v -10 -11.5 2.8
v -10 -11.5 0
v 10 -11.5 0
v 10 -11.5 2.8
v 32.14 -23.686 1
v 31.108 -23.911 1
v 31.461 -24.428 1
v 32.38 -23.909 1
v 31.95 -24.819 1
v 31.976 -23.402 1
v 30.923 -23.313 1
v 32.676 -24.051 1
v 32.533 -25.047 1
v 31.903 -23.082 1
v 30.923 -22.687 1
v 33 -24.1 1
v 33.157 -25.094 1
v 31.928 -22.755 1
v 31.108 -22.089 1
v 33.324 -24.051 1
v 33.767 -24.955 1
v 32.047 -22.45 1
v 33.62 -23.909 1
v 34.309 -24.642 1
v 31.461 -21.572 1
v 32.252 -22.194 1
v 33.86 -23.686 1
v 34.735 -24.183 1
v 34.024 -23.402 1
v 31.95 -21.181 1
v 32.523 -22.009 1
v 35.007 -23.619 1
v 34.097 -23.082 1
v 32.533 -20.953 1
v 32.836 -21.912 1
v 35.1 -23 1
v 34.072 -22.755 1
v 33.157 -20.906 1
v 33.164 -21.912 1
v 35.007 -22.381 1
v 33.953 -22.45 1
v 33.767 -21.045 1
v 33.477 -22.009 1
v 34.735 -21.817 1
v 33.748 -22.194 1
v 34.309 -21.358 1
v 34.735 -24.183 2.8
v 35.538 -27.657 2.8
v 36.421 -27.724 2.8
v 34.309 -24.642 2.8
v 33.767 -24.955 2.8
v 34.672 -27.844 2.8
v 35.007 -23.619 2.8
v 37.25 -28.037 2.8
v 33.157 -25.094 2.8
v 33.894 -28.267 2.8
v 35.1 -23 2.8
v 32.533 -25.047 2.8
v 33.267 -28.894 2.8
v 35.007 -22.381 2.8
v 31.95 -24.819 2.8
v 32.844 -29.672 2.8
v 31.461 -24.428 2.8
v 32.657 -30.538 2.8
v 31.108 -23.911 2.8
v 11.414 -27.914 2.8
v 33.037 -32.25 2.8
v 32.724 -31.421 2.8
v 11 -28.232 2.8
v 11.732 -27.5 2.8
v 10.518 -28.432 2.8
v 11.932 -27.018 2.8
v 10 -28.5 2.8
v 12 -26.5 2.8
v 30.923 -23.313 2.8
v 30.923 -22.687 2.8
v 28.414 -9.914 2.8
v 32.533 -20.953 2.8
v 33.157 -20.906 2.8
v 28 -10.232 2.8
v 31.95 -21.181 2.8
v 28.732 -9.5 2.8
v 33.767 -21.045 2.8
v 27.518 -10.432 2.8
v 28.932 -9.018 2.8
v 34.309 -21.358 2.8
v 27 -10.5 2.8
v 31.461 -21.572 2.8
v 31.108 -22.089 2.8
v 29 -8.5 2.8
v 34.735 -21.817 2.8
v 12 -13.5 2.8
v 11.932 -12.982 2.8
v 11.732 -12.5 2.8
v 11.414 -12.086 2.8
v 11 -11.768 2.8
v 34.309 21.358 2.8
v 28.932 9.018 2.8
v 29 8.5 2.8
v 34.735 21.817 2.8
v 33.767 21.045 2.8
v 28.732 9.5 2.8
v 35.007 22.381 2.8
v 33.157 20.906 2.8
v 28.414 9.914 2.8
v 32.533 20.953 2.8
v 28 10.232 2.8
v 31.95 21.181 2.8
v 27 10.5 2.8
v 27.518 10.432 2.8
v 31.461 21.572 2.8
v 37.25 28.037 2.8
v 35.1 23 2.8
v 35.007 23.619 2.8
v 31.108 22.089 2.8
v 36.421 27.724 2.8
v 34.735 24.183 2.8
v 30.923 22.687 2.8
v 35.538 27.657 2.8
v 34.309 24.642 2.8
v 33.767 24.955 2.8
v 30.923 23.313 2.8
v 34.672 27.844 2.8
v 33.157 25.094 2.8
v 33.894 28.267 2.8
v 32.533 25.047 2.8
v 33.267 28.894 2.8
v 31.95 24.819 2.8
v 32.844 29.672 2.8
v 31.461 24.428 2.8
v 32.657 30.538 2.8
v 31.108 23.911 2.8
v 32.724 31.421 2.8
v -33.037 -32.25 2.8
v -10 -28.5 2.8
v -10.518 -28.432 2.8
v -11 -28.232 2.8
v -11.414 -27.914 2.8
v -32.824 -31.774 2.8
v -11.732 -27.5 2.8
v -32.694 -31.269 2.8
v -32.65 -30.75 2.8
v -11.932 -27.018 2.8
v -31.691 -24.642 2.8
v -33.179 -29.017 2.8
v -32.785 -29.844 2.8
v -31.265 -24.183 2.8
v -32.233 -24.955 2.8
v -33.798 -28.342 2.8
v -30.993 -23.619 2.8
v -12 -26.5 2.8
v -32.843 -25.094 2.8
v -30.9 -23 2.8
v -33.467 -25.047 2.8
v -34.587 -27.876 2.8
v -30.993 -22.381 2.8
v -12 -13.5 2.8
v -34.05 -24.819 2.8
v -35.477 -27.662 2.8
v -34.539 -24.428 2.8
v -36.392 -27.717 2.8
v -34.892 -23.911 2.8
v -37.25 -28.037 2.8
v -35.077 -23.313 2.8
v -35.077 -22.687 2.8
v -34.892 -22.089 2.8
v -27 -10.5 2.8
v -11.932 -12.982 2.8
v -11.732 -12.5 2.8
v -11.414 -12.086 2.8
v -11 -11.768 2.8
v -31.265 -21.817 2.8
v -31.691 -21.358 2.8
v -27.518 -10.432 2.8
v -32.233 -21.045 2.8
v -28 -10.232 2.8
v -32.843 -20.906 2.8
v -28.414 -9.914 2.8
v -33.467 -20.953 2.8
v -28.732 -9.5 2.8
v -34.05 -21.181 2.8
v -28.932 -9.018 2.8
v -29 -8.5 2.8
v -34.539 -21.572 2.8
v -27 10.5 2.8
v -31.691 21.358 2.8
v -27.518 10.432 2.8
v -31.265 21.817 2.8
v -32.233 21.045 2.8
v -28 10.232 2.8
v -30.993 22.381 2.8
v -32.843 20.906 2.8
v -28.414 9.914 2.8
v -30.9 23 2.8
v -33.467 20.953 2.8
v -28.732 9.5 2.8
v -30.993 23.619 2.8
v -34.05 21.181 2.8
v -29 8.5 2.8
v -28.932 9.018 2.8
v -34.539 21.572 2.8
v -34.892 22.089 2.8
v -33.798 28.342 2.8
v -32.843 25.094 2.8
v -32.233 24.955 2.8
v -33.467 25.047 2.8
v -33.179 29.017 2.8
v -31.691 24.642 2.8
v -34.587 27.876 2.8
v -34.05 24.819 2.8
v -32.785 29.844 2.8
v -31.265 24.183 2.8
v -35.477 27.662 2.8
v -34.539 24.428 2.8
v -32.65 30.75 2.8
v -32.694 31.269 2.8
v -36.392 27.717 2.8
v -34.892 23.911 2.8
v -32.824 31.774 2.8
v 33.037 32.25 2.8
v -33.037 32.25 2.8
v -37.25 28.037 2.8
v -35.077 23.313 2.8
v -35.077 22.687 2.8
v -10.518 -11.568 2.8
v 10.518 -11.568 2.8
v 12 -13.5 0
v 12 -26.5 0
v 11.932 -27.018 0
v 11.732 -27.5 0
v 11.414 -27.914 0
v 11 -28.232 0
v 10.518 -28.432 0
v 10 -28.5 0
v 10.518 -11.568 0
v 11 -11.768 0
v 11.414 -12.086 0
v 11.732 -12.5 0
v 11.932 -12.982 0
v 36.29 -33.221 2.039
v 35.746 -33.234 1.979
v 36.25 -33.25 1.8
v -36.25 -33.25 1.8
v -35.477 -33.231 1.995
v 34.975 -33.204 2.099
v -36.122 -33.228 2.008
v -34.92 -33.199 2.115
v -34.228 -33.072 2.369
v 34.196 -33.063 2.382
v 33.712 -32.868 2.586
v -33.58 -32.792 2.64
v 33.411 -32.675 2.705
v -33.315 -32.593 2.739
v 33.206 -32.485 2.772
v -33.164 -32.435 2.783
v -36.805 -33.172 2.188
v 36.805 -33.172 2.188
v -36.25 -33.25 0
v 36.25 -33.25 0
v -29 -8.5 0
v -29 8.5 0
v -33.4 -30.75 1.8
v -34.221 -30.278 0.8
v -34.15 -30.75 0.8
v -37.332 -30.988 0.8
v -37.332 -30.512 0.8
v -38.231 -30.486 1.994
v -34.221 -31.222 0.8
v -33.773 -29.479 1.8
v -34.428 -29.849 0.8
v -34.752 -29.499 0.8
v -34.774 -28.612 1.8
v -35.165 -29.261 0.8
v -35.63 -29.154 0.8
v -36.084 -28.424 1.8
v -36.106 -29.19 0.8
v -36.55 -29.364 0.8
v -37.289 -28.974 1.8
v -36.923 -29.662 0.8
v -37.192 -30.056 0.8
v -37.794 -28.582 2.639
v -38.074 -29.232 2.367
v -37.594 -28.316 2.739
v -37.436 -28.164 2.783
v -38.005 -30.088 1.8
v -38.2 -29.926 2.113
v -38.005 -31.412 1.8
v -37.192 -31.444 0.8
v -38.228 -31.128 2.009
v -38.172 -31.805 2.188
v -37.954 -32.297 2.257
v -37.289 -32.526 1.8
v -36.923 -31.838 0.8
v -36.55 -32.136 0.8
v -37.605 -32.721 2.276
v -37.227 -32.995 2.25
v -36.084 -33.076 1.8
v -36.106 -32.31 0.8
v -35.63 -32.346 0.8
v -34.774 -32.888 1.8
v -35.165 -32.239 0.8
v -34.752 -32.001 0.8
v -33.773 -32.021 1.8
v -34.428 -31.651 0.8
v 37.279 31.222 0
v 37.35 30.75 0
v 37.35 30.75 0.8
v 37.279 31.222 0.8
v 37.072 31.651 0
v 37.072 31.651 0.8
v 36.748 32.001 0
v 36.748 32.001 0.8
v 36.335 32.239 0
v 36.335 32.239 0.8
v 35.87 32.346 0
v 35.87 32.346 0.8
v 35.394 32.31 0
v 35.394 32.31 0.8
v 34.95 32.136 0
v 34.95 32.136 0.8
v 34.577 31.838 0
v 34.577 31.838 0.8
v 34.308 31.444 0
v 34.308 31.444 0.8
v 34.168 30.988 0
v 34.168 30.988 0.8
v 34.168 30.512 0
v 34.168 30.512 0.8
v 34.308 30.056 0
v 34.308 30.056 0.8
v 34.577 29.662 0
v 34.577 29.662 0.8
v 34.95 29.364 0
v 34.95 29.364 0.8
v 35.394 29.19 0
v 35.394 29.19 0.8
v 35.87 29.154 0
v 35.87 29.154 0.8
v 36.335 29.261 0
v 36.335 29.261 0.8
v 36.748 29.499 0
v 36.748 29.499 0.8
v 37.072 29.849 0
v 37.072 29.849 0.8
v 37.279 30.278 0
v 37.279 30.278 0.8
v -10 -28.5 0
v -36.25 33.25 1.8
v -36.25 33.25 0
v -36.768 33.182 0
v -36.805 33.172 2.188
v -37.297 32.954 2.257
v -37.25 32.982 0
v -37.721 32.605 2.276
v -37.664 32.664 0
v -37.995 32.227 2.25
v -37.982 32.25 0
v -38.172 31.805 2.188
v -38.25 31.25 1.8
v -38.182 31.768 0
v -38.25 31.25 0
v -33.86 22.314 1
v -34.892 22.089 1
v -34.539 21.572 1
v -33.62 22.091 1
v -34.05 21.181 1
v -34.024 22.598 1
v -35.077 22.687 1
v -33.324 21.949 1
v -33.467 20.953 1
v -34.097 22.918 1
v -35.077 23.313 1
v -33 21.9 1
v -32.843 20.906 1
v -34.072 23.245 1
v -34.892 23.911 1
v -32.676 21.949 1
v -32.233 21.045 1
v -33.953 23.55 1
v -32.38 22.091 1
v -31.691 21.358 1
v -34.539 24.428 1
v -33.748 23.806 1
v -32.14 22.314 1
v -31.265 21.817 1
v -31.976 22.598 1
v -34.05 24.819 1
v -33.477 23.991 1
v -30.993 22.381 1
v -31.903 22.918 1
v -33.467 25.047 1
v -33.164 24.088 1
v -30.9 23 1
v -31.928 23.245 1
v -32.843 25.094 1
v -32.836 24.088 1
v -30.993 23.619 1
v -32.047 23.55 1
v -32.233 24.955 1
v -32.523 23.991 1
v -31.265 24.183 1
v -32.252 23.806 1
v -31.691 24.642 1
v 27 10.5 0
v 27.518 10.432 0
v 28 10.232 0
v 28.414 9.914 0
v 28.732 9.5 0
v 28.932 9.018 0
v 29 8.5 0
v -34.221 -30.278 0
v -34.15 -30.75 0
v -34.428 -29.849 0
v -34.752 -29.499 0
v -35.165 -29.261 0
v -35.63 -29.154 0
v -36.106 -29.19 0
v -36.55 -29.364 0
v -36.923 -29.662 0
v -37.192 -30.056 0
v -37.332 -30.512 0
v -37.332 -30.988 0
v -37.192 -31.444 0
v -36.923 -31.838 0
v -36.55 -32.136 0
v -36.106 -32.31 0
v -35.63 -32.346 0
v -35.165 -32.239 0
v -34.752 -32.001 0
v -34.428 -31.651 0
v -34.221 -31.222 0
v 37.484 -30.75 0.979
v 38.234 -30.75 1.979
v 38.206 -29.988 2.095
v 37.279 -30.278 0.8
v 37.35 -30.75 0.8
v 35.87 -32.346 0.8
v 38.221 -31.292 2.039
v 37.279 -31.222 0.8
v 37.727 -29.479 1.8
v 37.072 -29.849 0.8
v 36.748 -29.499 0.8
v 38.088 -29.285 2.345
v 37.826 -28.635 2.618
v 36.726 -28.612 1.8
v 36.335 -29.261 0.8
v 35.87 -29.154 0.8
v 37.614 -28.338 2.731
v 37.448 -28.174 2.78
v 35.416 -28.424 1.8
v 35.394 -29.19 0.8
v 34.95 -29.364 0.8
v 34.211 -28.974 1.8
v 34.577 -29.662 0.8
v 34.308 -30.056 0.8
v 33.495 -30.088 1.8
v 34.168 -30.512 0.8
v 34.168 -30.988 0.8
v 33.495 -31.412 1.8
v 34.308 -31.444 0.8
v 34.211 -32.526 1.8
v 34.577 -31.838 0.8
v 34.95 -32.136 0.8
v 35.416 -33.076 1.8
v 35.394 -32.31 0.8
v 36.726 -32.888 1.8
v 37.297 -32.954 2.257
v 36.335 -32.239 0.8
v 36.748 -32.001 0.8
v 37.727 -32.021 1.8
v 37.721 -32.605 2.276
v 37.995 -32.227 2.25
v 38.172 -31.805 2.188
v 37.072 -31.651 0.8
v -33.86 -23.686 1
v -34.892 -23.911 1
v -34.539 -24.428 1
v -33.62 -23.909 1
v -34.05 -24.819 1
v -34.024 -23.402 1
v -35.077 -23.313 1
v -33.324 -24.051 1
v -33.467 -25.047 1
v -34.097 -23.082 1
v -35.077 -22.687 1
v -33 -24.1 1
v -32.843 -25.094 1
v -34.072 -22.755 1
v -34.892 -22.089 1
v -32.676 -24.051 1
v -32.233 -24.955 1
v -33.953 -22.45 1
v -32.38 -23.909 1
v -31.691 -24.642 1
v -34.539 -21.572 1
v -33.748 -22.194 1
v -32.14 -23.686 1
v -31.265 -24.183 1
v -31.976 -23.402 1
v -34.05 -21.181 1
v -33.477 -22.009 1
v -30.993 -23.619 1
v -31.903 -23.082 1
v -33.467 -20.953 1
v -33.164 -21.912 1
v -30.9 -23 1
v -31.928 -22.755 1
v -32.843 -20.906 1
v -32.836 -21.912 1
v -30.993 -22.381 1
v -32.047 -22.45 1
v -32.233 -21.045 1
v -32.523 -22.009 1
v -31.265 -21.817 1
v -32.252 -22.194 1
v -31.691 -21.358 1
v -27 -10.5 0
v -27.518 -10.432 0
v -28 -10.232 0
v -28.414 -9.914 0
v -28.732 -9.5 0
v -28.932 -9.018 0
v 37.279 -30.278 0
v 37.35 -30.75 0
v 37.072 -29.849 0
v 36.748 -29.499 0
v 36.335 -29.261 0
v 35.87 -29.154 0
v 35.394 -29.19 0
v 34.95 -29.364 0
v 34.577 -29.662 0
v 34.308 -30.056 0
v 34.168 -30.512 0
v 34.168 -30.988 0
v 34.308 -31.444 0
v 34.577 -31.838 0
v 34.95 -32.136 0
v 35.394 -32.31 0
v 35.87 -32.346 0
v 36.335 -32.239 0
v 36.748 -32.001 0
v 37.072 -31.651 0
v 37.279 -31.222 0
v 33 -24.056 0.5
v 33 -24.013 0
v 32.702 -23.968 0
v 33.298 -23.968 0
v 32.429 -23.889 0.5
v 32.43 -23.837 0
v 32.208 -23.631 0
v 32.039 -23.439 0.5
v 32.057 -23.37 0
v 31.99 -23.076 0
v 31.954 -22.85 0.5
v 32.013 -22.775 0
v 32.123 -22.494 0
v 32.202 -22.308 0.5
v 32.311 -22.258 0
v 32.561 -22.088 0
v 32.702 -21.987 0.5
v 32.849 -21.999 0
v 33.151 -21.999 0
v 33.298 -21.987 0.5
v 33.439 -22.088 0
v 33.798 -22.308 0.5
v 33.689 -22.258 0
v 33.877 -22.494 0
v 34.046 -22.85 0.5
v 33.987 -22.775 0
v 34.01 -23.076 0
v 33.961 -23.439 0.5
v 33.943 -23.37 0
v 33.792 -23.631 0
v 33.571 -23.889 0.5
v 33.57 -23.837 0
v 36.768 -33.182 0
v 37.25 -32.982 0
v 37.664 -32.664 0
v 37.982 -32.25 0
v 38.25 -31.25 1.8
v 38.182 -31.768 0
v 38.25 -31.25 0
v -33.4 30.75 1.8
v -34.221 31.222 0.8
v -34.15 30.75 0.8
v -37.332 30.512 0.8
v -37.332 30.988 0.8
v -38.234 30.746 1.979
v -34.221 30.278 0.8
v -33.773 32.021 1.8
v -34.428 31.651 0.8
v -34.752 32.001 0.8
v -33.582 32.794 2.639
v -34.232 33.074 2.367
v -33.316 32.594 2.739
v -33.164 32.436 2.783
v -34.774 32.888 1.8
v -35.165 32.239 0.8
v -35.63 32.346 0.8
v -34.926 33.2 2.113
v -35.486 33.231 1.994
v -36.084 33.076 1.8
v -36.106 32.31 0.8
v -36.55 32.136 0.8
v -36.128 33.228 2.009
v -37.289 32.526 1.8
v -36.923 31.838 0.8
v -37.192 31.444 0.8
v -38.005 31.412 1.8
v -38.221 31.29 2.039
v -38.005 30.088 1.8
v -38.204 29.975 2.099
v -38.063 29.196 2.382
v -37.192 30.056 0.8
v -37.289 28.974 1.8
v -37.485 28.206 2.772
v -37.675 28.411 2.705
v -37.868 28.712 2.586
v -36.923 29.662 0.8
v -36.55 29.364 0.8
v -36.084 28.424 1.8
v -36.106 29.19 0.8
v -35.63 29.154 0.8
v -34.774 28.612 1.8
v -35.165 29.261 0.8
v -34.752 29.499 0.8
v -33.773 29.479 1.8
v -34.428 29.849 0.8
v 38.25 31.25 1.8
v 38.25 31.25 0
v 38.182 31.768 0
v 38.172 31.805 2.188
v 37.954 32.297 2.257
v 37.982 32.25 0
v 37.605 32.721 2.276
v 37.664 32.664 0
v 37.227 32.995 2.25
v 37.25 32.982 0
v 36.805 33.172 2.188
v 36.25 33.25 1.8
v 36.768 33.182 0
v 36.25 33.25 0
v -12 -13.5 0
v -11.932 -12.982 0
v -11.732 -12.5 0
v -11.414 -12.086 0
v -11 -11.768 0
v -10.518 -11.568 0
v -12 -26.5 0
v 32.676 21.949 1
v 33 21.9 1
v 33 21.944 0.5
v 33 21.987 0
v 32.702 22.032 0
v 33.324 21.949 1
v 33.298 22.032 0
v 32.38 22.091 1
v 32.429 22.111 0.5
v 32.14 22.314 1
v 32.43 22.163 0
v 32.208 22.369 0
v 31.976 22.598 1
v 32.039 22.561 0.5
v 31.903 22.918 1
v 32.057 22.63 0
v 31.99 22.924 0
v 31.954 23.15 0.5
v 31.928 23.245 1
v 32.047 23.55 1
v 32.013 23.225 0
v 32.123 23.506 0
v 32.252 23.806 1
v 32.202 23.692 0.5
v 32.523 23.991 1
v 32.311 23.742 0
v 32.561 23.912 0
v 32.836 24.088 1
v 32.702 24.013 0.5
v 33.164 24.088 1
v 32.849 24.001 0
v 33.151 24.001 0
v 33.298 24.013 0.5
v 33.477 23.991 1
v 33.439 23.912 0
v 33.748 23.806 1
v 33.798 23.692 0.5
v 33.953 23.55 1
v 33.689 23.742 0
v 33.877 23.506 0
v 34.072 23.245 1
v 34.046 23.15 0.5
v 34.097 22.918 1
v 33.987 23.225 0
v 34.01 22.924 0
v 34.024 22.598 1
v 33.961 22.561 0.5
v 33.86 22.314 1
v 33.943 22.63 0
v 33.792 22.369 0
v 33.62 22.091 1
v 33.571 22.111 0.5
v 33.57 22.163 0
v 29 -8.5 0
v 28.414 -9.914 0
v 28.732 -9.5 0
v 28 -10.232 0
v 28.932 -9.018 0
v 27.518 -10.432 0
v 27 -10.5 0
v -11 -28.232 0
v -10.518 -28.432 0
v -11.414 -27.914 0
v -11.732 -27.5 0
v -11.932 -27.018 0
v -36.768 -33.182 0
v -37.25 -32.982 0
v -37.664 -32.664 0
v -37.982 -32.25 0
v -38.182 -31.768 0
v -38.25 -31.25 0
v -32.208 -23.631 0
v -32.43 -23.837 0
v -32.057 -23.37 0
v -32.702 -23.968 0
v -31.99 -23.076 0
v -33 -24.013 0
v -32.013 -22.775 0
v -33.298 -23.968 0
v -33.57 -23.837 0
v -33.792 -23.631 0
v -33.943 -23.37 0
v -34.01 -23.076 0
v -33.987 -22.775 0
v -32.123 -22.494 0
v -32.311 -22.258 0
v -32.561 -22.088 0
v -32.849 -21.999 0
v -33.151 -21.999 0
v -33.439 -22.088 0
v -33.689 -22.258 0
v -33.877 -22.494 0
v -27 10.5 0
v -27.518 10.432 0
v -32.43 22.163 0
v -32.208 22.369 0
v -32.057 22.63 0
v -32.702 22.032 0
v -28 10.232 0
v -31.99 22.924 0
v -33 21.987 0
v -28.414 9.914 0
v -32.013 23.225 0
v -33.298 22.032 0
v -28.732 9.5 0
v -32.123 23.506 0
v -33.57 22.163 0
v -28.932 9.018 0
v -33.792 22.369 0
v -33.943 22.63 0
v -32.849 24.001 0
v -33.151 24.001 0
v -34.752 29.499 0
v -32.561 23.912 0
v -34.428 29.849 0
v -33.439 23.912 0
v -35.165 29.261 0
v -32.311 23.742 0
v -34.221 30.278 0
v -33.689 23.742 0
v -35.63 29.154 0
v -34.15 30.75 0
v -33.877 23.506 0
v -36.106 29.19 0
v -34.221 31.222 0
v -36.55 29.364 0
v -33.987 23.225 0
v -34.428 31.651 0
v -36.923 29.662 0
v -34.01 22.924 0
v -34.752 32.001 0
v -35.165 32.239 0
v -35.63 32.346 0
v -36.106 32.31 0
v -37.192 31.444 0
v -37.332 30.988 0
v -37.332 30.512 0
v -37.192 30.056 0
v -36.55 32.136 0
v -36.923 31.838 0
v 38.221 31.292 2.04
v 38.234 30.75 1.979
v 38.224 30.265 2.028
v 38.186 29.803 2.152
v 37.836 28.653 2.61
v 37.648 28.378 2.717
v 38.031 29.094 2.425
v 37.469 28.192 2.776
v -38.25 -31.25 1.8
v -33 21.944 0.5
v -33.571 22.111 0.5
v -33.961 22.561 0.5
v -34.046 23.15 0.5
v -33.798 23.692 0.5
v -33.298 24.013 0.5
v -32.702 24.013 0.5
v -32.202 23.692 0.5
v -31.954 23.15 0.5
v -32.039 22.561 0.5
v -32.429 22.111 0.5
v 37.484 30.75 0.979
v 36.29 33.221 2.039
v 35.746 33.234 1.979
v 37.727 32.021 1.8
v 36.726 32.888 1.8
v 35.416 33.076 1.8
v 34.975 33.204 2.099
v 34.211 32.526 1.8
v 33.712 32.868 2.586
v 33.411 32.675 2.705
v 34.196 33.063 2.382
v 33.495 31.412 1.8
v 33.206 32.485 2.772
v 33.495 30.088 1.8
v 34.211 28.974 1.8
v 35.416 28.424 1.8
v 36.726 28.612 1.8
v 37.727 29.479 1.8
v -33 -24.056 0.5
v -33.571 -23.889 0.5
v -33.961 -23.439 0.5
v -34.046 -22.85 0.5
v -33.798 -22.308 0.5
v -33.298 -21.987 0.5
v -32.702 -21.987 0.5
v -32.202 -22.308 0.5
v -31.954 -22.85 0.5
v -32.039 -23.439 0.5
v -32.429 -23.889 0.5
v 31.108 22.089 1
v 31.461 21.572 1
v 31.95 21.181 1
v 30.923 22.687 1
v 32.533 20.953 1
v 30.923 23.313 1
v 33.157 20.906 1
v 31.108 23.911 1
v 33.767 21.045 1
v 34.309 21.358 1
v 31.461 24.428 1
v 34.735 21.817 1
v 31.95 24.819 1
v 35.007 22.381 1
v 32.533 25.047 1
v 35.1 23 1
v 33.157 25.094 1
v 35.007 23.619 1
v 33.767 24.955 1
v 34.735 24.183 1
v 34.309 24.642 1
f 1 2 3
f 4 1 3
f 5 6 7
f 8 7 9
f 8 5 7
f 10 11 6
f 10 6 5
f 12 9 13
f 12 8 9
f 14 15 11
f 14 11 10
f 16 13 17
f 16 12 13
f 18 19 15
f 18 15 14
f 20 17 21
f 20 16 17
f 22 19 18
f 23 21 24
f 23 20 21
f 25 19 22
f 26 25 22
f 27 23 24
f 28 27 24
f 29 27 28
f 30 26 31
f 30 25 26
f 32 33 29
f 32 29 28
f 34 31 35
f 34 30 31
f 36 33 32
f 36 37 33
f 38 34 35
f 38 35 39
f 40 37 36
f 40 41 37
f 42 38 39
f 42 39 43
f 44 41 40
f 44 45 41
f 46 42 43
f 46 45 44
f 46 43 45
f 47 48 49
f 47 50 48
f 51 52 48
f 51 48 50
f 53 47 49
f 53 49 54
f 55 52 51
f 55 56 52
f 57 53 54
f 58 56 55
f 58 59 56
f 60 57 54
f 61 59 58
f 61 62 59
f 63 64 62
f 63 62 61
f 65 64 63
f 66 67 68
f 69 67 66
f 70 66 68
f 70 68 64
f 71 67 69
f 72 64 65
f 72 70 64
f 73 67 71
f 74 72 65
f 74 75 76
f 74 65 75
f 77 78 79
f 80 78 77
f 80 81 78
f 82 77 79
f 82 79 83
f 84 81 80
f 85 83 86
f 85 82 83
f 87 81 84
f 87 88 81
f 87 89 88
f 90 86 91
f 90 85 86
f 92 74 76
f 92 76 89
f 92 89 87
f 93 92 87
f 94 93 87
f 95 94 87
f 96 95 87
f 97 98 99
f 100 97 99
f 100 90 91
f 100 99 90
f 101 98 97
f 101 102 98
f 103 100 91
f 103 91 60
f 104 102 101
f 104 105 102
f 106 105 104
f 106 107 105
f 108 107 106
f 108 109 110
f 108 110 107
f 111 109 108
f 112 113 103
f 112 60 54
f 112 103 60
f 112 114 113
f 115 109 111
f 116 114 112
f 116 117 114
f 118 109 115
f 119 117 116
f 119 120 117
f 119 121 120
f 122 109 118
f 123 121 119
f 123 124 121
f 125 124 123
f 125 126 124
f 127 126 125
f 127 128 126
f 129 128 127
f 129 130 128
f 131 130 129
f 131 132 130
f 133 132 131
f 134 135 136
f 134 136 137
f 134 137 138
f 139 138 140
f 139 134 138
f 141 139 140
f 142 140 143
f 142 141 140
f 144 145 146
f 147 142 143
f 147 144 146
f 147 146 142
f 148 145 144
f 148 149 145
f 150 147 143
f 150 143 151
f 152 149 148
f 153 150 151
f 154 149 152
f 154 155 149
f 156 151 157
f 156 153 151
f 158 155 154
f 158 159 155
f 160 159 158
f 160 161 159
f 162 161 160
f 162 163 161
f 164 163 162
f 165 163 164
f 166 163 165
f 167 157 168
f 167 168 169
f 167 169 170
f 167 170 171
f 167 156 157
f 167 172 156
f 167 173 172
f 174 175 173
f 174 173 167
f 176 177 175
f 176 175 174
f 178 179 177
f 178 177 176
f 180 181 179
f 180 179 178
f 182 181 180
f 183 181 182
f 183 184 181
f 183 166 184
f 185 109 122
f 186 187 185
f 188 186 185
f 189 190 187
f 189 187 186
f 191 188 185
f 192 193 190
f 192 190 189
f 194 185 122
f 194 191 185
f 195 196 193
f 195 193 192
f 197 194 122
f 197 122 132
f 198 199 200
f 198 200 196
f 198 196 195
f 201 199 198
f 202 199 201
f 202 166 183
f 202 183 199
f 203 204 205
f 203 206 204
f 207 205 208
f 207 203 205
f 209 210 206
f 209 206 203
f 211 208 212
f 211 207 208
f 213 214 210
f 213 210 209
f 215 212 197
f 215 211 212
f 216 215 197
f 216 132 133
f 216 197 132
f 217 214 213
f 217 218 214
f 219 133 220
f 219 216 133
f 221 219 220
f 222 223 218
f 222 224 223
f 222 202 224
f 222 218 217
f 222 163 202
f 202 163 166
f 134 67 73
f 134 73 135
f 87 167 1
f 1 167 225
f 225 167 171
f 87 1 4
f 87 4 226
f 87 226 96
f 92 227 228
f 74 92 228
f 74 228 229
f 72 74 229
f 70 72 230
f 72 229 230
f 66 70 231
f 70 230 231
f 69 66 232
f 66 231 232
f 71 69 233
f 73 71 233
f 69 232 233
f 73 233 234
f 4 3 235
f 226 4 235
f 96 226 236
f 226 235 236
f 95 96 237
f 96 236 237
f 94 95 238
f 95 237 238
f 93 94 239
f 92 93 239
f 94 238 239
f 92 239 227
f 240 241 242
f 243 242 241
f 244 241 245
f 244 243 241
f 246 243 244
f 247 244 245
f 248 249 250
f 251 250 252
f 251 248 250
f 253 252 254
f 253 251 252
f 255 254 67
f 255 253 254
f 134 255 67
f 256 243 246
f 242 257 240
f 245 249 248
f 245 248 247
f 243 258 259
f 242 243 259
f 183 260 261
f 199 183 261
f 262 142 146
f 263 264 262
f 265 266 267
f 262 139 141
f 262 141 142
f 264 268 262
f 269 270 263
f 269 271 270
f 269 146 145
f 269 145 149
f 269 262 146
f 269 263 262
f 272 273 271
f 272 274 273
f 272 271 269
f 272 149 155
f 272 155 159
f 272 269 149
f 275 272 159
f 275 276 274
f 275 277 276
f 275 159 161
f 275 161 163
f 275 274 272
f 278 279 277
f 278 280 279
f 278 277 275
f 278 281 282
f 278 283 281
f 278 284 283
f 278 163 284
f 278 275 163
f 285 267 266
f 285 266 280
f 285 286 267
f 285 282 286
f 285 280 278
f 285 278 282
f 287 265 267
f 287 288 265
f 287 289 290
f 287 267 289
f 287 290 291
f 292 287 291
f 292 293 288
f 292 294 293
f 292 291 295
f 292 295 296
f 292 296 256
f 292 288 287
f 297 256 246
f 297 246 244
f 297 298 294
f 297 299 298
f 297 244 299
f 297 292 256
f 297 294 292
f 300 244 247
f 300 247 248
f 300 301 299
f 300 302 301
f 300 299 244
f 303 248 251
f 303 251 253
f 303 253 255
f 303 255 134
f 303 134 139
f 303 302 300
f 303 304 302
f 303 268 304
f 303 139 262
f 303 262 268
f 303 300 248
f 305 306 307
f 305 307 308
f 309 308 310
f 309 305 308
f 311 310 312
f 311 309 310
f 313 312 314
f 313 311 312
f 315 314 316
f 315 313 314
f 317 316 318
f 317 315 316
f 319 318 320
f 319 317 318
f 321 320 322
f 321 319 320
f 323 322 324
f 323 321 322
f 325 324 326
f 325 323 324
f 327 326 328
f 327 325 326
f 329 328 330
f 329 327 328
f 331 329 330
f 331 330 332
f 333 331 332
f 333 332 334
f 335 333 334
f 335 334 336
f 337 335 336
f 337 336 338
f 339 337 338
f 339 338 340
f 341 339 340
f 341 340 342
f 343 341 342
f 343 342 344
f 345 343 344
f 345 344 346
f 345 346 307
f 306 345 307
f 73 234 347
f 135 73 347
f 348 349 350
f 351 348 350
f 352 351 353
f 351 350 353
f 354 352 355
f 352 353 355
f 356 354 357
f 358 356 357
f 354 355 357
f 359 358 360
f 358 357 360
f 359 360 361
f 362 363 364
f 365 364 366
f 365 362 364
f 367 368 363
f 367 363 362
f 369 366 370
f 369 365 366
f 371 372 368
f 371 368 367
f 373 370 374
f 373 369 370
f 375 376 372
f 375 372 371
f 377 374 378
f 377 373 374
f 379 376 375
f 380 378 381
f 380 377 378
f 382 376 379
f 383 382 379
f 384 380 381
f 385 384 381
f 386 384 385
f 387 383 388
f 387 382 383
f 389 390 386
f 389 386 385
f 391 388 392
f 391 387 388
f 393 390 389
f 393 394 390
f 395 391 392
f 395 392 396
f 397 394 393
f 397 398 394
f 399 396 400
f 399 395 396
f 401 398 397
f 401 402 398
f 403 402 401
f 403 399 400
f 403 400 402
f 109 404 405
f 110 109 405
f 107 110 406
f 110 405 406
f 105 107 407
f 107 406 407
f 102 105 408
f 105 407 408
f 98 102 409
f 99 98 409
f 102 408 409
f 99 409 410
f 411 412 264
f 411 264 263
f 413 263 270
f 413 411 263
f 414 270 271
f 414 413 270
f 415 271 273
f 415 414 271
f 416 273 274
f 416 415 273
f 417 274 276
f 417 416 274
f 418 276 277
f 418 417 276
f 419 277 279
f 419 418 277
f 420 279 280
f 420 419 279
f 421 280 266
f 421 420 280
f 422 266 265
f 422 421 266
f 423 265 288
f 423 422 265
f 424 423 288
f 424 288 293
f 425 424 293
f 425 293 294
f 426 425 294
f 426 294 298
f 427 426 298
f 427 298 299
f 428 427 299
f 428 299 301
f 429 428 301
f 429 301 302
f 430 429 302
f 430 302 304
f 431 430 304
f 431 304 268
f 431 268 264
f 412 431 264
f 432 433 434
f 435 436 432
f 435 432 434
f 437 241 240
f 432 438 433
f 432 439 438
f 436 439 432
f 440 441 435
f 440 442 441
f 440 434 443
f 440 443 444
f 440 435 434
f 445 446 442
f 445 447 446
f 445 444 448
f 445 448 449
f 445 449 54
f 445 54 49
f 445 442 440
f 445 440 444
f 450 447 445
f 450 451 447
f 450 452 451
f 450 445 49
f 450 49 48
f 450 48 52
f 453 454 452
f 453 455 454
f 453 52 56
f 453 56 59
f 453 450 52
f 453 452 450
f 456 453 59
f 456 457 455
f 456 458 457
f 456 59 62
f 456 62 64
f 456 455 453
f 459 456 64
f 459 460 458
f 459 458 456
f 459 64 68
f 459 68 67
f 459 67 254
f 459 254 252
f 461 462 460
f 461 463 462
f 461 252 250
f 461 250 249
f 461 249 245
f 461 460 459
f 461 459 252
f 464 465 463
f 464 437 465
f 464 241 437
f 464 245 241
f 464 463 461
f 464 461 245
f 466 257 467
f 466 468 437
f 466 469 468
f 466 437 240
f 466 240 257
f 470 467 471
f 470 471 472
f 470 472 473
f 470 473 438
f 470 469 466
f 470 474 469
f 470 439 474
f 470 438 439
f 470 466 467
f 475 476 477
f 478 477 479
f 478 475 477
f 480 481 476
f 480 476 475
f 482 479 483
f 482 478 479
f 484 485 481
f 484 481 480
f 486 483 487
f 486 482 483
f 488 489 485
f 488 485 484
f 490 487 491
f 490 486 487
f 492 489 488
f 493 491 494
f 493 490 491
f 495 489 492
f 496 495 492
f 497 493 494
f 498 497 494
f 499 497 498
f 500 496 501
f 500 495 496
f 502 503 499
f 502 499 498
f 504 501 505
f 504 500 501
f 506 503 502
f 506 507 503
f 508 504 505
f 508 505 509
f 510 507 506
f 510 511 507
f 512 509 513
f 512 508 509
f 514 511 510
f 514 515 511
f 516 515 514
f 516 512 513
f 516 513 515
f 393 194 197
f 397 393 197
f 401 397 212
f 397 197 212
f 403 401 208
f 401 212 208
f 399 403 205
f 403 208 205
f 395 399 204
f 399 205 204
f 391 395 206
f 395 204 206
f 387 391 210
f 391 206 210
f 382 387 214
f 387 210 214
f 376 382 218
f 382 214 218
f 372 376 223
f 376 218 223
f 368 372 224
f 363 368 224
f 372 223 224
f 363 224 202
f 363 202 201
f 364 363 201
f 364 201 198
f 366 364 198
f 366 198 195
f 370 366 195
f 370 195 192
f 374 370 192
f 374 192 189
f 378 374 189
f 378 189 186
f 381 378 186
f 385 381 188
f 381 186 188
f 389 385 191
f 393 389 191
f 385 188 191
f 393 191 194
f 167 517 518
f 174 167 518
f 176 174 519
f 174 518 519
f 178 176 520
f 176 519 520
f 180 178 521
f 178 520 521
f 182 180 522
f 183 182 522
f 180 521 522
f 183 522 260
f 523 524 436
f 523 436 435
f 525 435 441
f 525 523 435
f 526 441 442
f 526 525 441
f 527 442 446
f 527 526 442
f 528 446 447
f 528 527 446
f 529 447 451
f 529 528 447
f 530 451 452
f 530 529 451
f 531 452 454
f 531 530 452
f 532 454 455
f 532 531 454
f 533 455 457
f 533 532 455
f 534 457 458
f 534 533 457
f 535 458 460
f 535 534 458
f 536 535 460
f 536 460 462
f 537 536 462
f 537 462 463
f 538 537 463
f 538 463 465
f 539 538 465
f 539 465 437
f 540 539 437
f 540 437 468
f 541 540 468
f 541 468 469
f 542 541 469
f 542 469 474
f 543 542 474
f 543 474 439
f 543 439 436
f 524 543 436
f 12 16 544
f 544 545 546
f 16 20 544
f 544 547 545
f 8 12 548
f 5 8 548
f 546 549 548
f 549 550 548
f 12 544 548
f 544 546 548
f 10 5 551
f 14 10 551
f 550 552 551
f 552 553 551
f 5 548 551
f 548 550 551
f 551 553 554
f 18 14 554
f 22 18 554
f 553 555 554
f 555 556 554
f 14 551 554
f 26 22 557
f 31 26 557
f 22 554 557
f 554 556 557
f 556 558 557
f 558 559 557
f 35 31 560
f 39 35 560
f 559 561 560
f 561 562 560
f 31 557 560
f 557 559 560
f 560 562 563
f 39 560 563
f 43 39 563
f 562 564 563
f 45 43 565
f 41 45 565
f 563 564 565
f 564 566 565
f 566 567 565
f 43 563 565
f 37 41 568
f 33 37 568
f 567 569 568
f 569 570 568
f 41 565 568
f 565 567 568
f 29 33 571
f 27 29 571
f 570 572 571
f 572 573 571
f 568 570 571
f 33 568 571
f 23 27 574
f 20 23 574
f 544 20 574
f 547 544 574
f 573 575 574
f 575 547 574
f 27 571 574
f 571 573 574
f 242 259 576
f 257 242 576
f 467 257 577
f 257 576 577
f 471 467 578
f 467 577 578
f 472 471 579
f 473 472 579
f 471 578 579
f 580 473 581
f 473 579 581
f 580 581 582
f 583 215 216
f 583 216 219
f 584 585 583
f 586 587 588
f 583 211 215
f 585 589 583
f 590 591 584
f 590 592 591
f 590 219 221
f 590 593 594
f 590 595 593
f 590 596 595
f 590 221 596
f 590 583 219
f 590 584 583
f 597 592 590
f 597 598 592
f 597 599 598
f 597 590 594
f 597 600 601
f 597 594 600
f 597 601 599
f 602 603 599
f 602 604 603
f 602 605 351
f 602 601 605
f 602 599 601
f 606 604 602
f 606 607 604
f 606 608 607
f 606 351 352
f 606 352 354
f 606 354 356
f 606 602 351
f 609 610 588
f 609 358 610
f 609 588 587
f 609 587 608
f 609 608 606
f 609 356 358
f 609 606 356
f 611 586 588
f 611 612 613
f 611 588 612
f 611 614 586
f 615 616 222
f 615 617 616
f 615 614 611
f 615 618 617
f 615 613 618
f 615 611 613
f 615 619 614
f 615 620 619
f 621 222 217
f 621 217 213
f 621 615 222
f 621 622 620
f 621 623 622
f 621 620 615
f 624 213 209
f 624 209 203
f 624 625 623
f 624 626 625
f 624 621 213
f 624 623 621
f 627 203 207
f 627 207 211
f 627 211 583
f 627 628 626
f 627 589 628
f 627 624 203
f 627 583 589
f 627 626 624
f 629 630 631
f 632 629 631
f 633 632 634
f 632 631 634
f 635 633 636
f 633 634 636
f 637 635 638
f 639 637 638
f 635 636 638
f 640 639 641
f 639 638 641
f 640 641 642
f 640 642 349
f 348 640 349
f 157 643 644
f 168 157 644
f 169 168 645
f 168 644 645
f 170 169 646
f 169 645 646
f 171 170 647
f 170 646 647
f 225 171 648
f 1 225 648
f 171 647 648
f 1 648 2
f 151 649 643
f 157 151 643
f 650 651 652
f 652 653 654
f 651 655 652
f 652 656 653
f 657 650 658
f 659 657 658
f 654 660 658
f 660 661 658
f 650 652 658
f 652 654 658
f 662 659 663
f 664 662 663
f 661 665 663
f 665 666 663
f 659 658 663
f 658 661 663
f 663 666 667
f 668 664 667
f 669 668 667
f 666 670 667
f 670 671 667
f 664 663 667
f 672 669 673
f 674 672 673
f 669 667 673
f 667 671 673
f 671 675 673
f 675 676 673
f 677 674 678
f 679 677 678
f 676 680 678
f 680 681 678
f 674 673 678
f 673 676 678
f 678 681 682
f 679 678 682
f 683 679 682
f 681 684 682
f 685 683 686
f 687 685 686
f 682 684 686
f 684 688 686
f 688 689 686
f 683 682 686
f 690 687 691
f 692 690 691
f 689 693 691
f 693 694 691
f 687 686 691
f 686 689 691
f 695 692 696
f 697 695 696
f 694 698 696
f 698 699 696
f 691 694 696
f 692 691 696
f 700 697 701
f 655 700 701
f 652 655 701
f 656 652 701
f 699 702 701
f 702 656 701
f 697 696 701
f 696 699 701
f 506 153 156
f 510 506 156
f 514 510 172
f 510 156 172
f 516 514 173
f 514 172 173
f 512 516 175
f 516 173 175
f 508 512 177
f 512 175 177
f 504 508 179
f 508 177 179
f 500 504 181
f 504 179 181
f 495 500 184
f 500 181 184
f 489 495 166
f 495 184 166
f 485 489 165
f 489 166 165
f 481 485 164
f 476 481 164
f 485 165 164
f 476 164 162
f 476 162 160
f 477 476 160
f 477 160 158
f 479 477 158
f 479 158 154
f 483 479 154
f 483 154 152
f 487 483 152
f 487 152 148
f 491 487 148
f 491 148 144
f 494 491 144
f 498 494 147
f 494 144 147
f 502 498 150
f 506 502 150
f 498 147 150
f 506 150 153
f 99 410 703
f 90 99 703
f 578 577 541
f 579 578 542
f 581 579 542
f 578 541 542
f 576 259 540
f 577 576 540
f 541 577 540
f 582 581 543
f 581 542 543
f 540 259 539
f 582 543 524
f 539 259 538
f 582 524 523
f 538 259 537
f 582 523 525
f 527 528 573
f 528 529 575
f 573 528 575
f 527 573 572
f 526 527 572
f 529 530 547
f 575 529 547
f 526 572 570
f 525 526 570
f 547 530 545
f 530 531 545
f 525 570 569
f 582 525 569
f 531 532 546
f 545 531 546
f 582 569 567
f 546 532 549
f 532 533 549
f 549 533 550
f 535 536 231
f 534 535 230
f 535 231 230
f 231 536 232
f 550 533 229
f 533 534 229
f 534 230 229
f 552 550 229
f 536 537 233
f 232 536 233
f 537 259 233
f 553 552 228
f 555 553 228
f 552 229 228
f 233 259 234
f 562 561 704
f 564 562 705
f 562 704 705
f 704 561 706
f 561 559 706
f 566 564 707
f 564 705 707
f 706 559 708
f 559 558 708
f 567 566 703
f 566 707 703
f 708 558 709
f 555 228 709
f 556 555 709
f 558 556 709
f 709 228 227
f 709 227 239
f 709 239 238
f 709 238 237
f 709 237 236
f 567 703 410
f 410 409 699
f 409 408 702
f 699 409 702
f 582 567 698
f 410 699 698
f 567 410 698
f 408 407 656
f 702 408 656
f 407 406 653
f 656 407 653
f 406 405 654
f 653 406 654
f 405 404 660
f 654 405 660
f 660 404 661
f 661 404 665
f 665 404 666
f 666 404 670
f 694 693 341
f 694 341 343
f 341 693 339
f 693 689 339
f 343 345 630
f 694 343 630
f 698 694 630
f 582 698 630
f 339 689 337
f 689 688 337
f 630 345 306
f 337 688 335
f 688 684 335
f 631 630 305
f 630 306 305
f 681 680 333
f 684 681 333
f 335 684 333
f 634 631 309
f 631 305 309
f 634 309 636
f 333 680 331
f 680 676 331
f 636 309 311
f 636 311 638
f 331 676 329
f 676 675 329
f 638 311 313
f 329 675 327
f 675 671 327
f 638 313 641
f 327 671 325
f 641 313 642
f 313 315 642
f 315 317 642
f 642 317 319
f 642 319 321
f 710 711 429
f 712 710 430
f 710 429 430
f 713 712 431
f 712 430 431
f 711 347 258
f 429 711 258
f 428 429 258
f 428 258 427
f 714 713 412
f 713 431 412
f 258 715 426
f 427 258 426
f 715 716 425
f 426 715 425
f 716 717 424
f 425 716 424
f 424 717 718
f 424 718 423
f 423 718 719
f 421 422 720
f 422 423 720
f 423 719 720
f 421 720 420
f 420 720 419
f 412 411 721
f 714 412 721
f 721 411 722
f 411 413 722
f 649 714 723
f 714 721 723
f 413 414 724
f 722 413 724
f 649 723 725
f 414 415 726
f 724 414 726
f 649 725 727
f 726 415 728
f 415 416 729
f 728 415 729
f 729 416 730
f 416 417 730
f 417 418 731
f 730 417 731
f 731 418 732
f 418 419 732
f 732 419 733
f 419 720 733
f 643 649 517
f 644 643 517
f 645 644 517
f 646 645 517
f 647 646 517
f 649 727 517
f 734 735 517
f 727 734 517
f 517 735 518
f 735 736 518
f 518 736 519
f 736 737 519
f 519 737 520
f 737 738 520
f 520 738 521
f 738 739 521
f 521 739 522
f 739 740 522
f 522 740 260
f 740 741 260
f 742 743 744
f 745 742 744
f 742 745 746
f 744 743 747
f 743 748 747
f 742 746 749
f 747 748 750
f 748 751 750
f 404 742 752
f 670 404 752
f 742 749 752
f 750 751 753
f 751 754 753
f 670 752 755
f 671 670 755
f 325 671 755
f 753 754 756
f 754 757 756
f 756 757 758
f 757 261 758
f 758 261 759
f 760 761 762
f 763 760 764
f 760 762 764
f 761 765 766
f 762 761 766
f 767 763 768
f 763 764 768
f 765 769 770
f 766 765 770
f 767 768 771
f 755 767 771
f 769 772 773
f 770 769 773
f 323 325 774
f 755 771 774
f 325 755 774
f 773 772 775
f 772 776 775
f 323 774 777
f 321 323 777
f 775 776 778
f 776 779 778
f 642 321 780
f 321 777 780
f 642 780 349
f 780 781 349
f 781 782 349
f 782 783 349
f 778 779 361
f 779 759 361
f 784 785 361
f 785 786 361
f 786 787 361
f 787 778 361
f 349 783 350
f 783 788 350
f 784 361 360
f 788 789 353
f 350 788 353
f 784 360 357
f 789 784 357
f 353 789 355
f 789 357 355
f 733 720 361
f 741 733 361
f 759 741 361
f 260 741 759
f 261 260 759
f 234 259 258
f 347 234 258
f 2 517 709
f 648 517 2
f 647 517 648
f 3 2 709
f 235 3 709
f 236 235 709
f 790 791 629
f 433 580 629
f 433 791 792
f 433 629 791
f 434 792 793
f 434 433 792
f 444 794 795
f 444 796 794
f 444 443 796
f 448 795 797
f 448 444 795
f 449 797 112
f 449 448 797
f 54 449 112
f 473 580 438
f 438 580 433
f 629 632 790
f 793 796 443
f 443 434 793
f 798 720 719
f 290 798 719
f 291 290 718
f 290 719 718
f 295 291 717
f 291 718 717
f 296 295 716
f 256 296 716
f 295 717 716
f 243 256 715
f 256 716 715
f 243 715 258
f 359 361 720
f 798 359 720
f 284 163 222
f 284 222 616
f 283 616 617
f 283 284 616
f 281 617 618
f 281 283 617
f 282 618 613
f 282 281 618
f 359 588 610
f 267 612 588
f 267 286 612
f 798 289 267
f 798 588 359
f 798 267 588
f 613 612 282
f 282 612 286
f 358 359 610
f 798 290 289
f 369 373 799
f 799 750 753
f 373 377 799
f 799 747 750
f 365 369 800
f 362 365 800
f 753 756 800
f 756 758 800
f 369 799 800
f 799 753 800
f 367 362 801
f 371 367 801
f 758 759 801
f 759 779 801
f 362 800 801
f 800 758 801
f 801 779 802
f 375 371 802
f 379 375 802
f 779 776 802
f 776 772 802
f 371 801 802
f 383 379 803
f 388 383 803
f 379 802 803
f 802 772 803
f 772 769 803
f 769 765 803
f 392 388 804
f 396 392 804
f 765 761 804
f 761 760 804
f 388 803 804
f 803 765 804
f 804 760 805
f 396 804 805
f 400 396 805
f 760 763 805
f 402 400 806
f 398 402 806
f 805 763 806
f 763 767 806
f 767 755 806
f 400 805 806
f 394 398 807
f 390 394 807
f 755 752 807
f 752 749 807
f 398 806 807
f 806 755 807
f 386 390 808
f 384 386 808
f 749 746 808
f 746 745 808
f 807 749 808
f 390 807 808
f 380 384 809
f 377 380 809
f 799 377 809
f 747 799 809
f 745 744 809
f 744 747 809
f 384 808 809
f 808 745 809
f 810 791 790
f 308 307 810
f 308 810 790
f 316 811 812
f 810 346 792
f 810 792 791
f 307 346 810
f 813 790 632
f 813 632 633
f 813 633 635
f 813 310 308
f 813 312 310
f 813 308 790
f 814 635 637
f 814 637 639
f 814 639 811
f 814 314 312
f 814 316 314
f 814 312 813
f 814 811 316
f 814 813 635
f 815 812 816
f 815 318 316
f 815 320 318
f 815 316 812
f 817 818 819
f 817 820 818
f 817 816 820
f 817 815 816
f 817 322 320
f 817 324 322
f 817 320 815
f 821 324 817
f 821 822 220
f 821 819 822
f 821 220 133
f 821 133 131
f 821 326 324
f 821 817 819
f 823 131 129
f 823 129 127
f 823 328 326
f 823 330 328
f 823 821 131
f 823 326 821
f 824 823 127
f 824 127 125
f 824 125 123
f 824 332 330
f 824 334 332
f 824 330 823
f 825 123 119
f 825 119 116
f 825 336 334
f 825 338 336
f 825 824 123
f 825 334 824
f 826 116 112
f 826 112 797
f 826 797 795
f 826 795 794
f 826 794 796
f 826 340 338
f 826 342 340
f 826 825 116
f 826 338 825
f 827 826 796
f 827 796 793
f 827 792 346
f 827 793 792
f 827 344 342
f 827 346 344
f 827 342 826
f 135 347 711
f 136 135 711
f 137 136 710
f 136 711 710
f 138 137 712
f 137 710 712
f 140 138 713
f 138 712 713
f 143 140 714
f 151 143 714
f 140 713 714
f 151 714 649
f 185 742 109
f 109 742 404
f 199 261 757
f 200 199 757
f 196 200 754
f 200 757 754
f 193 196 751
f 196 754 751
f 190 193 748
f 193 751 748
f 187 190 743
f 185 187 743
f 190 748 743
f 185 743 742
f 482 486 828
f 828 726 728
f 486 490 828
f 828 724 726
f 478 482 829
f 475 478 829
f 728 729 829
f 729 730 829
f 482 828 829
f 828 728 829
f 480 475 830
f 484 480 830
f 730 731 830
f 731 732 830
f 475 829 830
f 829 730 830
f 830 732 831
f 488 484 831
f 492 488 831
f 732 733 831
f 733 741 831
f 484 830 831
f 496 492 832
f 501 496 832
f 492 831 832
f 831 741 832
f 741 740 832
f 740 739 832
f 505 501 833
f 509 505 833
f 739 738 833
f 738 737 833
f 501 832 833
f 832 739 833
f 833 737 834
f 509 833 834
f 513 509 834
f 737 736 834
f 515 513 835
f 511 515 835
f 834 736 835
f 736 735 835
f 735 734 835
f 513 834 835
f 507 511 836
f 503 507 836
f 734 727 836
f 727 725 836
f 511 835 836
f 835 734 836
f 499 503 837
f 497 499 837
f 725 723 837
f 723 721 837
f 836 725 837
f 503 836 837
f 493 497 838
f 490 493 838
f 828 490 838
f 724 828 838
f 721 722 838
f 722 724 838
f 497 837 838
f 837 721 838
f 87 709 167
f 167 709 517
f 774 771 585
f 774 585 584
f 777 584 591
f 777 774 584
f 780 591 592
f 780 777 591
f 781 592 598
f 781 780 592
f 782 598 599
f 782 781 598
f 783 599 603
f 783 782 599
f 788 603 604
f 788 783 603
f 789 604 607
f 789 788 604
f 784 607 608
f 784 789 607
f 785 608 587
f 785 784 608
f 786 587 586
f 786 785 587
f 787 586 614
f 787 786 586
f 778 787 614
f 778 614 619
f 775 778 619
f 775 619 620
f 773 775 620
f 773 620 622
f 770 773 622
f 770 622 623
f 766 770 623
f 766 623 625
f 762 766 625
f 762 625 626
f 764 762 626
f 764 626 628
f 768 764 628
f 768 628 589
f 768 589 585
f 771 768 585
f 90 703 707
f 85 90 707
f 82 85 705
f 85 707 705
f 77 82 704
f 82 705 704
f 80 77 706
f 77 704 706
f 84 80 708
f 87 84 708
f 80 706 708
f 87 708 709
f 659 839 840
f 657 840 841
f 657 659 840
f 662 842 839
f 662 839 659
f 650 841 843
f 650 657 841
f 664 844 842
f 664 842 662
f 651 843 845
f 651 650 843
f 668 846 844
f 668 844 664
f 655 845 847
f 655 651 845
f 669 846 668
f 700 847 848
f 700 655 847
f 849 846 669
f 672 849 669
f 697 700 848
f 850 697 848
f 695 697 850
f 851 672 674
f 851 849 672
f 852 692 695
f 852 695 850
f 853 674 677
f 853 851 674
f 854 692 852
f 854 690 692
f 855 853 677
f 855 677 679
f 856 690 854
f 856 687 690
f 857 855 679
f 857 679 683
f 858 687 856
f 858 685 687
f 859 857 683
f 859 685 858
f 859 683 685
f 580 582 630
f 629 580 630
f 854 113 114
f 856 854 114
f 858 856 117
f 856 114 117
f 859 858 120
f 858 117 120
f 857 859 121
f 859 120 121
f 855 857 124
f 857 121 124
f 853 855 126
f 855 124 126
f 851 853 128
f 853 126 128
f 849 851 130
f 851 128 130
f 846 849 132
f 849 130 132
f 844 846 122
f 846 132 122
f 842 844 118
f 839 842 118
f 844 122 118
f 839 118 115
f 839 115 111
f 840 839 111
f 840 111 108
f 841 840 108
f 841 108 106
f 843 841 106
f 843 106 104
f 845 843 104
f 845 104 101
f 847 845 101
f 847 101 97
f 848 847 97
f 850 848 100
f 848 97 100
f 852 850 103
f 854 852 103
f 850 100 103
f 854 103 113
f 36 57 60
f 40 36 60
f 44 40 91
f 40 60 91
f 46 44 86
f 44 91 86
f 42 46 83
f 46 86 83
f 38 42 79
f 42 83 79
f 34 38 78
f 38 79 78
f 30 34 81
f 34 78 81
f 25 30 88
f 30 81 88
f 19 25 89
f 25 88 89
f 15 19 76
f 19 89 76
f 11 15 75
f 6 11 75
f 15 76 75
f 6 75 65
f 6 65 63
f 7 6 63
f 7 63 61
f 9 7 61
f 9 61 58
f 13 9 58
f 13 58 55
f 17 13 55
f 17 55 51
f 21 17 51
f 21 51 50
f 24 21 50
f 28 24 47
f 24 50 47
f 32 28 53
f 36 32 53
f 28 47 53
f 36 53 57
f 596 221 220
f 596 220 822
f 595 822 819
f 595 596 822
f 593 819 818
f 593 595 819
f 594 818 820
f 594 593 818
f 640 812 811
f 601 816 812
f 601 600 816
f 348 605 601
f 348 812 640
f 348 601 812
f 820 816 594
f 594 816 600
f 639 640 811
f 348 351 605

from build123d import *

# Parameters (mm, degrees)
SKETCH1_R           = 1.6
BOSS_EXTRUDE1_DEPTH = 2.8
CUT_EXTRUDE2_START  = 2.8
SKETCH1_6_R         = 2.1
CUT_EXTRUDE2_DEPTH  = 1.8
CHAMFER1_SIZE       = 1.5
CHAMFER1_SIZE_2     = 2
FILLET1_START       = -33.224011807
FILLET1_DEPTH       = 66.448023614
FILLET1_START_2     = -38.224011807
FILLET1_2_DEPTH     = 76.3236742


with BuildPart() as part:
    # Sketch1 → Boss-Extrude1 (new body)
    with BuildSketch(Plane(origin=(0, 0, 0), x_dir=(0, 1, 0), z_dir=(0, 0, 1))):
        with BuildLine():
            Line((31.25, 38.25), (-31.25, 38.25))
            ThreePointArc((-31.25, 38.25), (-32.664213562, 37.664213562), (-33.25, 36.25))
            Line((-33.25, 36.25), (-33.25, -36.25))
            ThreePointArc((-33.25, -36.25), (-32.664213562, -37.664213562), (-31.25, -38.25))
            Line((-31.25, -38.25), (31.25, -38.25))
            ThreePointArc((31.25, -38.25), (32.664213562, -37.664213562), (33.25, -36.25))
            Line((33.25, -36.25), (33.25, 36.25))
            ThreePointArc((33.25, 36.25), (32.664213562, 37.664213562), (31.25, 38.25))
        make_face()
        with Locations(Location((-30.75, -35.75, 0), (0, 0, 270))):
            Circle(SKETCH1_R, mode=Mode.SUBTRACT)
        with Locations(Location((30.75, -35.75, 0), (0, 0, 270))):
            Circle(SKETCH1_R, mode=Mode.SUBTRACT)
        with BuildLine():
            ThreePointArc((-28.5, 10), (-27.914213562, 11.414213562), (-26.5, 12))
            Line((-26.5, 12), (-13.5, 12))
            ThreePointArc((-13.5, 12), (-12.085786438, 11.414213562), (-11.5, 10))
            Line((-11.5, 10), (-11.5, -10))
            ThreePointArc((-11.5, -10), (-12.085786438, -11.414213562), (-13.5, -12))
            Line((-13.5, -12), (-26.5, -12))
            ThreePointArc((-26.5, -12), (-27.914213562, -11.414213562), (-28.5, -10))
            Line((-28.5, -10), (-28.5, 10))
        make_face(mode=Mode.SUBTRACT)
        with Locations(Location((-30.75, 35.75, 0), (0, 0, 270))):
            Circle(SKETCH1_R, mode=Mode.SUBTRACT)
        with BuildLine():
            Line((-10.5, -27), (-10.5, 27))
            ThreePointArc((-10.5, 27), (-9.914213562, 28.414213562), (-8.5, 29))
            Line((-8.5, 29), (8.5, 29))
            ThreePointArc((8.5, 29), (9.914213562, 28.414213562), (10.5, 27))
            Line((10.5, 27), (10.5, -27))
            ThreePointArc((10.5, -27), (9.914213562, -28.414213562), (8.5, -29))
            Line((8.5, -29), (-8.5, -29))
            ThreePointArc((-8.5, -29), (-9.914213562, -28.414213562), (-10.5, -27))
        make_face(mode=Mode.SUBTRACT)
        with Locations(Location((30.75, 35.75, 0), (0, 0, 270))):
            Circle(SKETCH1_R, mode=Mode.SUBTRACT)
    extrude(amount=BOSS_EXTRUDE1_DEPTH)

    # Sketch1<6> → Cut-Extrude2 (cut)
    with BuildSketch(Plane(origin=(0, 0, 0), x_dir=(0, 1, 0), z_dir=(0, 0, 1)).offset(CUT_EXTRUDE2_START)):
        with Locations(Location((-23, 33, 0), (0, 0, 270))):
            Circle(SKETCH1_6_R)
        with Locations(Location((23, 33, 0), (0, 0, 270))):
            Circle(SKETCH1_6_R)
        with Locations(Location((23, -33, 0), (0, 0, 270))):
            Circle(SKETCH1_6_R)
        with Locations(Location((-23, -33, 0), (0, 0, 270))):
            Circle(SKETCH1_6_R)
    extrude(amount=-CUT_EXTRUDE2_DEPTH, mode=Mode.SUBTRACT)

    # Cut-Extrude1 cone 1 section (through the dimple's axis) → Cut-Extrude1 (revolve, cut)
    with BuildSketch(Plane(origin=(33, -23, 1), x_dir=(0, -1, 0), z_dir=(1, 0, 0))):
        Polygon((0, 0), (1.1, 0), (0, 12.573057533), align=None)
    revolve(axis=Axis((33, -23, 1), (0, 0, -1)), mode=Mode.SUBTRACT)

    # Cut-Extrude1 cone 2 section (through the dimple's axis) → Cut-Extrude1 cone 2 (revolve, cut)
    with BuildSketch(Plane(origin=(-33, -23, 1), x_dir=(0, -1, 0), z_dir=(1, 0, 0))):
        Polygon((0, 0), (1.1, 0), (0, 12.573057533), align=None)
    revolve(axis=Axis((-33, -23, 1), (0, 0, -1)), mode=Mode.SUBTRACT)

    # Cut-Extrude1 cone 3 section (through the dimple's axis) → Cut-Extrude1 cone 3 (revolve, cut)
    with BuildSketch(Plane(origin=(-33, 23, 1), x_dir=(0, -1, 0), z_dir=(1, 0, 0))):
        Polygon((0, 0), (1.1, 0), (0, 12.573057533), align=None)
    revolve(axis=Axis((-33, 23, 1), (0, 0, -1)), mode=Mode.SUBTRACT)

    # Cut-Extrude1 cone 4 section (through the dimple's axis) → Cut-Extrude1 cone 4 (revolve, cut)
    with BuildSketch(Plane(origin=(33, 23, 1), x_dir=(0, -1, 0), z_dir=(1, 0, 0))):
        Polygon((0, 0), (1.1, 0), (0, 12.573057533), align=None)
    revolve(axis=Axis((33, 23, 1), (0, 0, -1)), mode=Mode.SUBTRACT)

    # Chamfer1
    # the kernel refuses this chamfer: 2, 1.5 mm, written as the material it takes off along each edge
    with BuildSketch(Plane(origin=(-35.75, -30.75, 2.8), x_dir=(1, 0, 0), z_dir=(0, -1, 0))) as chamfer1_piece_1:
        Polygon((1.6 + CHAMFER1_SIZE, 0), (1.6, -CHAMFER1_SIZE_2), (1.6, 0), align=None)
    revolve(axis=Axis((-35.75, -30.75, 2.8), (0, 0, 1)), mode=Mode.SUBTRACT)
    with BuildSketch(Plane(origin=(35.75, -30.75, 2.8), x_dir=(1, 0, 0), z_dir=(0, -1, 0))) as chamfer1_piece_2:
        Polygon((1.6 + CHAMFER1_SIZE, 0), (1.6, -CHAMFER1_SIZE_2), (1.6, 0), align=None)
    revolve(axis=Axis((35.75, -30.75, 2.8), (0, 0, 1)), mode=Mode.SUBTRACT)
    with BuildSketch(Plane(origin=(35.75, 30.75, 2.8), x_dir=(1, 0, 0), z_dir=(0, -1, 0))) as chamfer1_piece_3:
        Polygon((1.6 + CHAMFER1_SIZE, 0), (1.6, -CHAMFER1_SIZE_2), (1.6, 0), align=None)
    revolve(axis=Axis((35.75, 30.75, 2.8), (0, 0, 1)), mode=Mode.SUBTRACT)
    with BuildSketch(Plane(origin=(-35.75, 30.75, 2.8), x_dir=(1, 0, 0), z_dir=(0, -1, 0))) as chamfer1_piece_4:
        Polygon((1.6 + CHAMFER1_SIZE, 0), (1.6, -CHAMFER1_SIZE_2), (1.6, 0), align=None)
    revolve(axis=Axis((-35.75, 30.75, 2.8), (0, 0, 1)), mode=Mode.SUBTRACT)

    # Fillet1: read off the stored shape, not the designer's step
    # Fillet1 outline → Fillet1 (cut)
    with BuildSketch(Plane(origin=(0, 0, 0), x_dir=(1, 0, 0), z_dir=(0, 1, 0)).offset(FILLET1_START)):
        with BuildLine():
            ThreePointArc((38.25, -1.8), (37.957106781, -2.507106781), (37.25, -2.8))
            Line((37.25, -2.8), (38.25, -2.8))
            Line((38.25, -2.8), (38.25, -1.8))
        make_face()
        with BuildLine():
            ThreePointArc((-37.25, -2.8), (-37.957106781, -2.507106781), (-38.25, -1.8))
            Line((-38.25, -1.8), (-38.25, -2.8))
            Line((-38.25, -2.8), (-37.25, -2.8))
        make_face()
    extrude(amount=FILLET1_DEPTH, mode=Mode.SUBTRACT)

    # Fillet1 2 outline → Fillet1 2 (cut)
    with BuildSketch(Plane.YZ.offset(FILLET1_START_2)):
        with BuildLine():
            Line((-33.25, 2.8), (-33.25, 1.8))
            ThreePointArc((-33.25, 1.8), (-32.957106781, 2.507106781), (-32.25, 2.8))
            Line((-32.25, 2.8), (-33.25, 2.8))
        make_face()
        with BuildLine():
            Line((33.25, 2.8), (32.25, 2.8))
            ThreePointArc((32.25, 2.8), (32.957106781, 2.507106781), (33.25, 1.8))
            Line((33.25, 1.8), (33.25, 2.8))
        make_face()
    extrude(amount=FILLET1_2_DEPTH, mode=Mode.SUBTRACT)


solid = part.part
